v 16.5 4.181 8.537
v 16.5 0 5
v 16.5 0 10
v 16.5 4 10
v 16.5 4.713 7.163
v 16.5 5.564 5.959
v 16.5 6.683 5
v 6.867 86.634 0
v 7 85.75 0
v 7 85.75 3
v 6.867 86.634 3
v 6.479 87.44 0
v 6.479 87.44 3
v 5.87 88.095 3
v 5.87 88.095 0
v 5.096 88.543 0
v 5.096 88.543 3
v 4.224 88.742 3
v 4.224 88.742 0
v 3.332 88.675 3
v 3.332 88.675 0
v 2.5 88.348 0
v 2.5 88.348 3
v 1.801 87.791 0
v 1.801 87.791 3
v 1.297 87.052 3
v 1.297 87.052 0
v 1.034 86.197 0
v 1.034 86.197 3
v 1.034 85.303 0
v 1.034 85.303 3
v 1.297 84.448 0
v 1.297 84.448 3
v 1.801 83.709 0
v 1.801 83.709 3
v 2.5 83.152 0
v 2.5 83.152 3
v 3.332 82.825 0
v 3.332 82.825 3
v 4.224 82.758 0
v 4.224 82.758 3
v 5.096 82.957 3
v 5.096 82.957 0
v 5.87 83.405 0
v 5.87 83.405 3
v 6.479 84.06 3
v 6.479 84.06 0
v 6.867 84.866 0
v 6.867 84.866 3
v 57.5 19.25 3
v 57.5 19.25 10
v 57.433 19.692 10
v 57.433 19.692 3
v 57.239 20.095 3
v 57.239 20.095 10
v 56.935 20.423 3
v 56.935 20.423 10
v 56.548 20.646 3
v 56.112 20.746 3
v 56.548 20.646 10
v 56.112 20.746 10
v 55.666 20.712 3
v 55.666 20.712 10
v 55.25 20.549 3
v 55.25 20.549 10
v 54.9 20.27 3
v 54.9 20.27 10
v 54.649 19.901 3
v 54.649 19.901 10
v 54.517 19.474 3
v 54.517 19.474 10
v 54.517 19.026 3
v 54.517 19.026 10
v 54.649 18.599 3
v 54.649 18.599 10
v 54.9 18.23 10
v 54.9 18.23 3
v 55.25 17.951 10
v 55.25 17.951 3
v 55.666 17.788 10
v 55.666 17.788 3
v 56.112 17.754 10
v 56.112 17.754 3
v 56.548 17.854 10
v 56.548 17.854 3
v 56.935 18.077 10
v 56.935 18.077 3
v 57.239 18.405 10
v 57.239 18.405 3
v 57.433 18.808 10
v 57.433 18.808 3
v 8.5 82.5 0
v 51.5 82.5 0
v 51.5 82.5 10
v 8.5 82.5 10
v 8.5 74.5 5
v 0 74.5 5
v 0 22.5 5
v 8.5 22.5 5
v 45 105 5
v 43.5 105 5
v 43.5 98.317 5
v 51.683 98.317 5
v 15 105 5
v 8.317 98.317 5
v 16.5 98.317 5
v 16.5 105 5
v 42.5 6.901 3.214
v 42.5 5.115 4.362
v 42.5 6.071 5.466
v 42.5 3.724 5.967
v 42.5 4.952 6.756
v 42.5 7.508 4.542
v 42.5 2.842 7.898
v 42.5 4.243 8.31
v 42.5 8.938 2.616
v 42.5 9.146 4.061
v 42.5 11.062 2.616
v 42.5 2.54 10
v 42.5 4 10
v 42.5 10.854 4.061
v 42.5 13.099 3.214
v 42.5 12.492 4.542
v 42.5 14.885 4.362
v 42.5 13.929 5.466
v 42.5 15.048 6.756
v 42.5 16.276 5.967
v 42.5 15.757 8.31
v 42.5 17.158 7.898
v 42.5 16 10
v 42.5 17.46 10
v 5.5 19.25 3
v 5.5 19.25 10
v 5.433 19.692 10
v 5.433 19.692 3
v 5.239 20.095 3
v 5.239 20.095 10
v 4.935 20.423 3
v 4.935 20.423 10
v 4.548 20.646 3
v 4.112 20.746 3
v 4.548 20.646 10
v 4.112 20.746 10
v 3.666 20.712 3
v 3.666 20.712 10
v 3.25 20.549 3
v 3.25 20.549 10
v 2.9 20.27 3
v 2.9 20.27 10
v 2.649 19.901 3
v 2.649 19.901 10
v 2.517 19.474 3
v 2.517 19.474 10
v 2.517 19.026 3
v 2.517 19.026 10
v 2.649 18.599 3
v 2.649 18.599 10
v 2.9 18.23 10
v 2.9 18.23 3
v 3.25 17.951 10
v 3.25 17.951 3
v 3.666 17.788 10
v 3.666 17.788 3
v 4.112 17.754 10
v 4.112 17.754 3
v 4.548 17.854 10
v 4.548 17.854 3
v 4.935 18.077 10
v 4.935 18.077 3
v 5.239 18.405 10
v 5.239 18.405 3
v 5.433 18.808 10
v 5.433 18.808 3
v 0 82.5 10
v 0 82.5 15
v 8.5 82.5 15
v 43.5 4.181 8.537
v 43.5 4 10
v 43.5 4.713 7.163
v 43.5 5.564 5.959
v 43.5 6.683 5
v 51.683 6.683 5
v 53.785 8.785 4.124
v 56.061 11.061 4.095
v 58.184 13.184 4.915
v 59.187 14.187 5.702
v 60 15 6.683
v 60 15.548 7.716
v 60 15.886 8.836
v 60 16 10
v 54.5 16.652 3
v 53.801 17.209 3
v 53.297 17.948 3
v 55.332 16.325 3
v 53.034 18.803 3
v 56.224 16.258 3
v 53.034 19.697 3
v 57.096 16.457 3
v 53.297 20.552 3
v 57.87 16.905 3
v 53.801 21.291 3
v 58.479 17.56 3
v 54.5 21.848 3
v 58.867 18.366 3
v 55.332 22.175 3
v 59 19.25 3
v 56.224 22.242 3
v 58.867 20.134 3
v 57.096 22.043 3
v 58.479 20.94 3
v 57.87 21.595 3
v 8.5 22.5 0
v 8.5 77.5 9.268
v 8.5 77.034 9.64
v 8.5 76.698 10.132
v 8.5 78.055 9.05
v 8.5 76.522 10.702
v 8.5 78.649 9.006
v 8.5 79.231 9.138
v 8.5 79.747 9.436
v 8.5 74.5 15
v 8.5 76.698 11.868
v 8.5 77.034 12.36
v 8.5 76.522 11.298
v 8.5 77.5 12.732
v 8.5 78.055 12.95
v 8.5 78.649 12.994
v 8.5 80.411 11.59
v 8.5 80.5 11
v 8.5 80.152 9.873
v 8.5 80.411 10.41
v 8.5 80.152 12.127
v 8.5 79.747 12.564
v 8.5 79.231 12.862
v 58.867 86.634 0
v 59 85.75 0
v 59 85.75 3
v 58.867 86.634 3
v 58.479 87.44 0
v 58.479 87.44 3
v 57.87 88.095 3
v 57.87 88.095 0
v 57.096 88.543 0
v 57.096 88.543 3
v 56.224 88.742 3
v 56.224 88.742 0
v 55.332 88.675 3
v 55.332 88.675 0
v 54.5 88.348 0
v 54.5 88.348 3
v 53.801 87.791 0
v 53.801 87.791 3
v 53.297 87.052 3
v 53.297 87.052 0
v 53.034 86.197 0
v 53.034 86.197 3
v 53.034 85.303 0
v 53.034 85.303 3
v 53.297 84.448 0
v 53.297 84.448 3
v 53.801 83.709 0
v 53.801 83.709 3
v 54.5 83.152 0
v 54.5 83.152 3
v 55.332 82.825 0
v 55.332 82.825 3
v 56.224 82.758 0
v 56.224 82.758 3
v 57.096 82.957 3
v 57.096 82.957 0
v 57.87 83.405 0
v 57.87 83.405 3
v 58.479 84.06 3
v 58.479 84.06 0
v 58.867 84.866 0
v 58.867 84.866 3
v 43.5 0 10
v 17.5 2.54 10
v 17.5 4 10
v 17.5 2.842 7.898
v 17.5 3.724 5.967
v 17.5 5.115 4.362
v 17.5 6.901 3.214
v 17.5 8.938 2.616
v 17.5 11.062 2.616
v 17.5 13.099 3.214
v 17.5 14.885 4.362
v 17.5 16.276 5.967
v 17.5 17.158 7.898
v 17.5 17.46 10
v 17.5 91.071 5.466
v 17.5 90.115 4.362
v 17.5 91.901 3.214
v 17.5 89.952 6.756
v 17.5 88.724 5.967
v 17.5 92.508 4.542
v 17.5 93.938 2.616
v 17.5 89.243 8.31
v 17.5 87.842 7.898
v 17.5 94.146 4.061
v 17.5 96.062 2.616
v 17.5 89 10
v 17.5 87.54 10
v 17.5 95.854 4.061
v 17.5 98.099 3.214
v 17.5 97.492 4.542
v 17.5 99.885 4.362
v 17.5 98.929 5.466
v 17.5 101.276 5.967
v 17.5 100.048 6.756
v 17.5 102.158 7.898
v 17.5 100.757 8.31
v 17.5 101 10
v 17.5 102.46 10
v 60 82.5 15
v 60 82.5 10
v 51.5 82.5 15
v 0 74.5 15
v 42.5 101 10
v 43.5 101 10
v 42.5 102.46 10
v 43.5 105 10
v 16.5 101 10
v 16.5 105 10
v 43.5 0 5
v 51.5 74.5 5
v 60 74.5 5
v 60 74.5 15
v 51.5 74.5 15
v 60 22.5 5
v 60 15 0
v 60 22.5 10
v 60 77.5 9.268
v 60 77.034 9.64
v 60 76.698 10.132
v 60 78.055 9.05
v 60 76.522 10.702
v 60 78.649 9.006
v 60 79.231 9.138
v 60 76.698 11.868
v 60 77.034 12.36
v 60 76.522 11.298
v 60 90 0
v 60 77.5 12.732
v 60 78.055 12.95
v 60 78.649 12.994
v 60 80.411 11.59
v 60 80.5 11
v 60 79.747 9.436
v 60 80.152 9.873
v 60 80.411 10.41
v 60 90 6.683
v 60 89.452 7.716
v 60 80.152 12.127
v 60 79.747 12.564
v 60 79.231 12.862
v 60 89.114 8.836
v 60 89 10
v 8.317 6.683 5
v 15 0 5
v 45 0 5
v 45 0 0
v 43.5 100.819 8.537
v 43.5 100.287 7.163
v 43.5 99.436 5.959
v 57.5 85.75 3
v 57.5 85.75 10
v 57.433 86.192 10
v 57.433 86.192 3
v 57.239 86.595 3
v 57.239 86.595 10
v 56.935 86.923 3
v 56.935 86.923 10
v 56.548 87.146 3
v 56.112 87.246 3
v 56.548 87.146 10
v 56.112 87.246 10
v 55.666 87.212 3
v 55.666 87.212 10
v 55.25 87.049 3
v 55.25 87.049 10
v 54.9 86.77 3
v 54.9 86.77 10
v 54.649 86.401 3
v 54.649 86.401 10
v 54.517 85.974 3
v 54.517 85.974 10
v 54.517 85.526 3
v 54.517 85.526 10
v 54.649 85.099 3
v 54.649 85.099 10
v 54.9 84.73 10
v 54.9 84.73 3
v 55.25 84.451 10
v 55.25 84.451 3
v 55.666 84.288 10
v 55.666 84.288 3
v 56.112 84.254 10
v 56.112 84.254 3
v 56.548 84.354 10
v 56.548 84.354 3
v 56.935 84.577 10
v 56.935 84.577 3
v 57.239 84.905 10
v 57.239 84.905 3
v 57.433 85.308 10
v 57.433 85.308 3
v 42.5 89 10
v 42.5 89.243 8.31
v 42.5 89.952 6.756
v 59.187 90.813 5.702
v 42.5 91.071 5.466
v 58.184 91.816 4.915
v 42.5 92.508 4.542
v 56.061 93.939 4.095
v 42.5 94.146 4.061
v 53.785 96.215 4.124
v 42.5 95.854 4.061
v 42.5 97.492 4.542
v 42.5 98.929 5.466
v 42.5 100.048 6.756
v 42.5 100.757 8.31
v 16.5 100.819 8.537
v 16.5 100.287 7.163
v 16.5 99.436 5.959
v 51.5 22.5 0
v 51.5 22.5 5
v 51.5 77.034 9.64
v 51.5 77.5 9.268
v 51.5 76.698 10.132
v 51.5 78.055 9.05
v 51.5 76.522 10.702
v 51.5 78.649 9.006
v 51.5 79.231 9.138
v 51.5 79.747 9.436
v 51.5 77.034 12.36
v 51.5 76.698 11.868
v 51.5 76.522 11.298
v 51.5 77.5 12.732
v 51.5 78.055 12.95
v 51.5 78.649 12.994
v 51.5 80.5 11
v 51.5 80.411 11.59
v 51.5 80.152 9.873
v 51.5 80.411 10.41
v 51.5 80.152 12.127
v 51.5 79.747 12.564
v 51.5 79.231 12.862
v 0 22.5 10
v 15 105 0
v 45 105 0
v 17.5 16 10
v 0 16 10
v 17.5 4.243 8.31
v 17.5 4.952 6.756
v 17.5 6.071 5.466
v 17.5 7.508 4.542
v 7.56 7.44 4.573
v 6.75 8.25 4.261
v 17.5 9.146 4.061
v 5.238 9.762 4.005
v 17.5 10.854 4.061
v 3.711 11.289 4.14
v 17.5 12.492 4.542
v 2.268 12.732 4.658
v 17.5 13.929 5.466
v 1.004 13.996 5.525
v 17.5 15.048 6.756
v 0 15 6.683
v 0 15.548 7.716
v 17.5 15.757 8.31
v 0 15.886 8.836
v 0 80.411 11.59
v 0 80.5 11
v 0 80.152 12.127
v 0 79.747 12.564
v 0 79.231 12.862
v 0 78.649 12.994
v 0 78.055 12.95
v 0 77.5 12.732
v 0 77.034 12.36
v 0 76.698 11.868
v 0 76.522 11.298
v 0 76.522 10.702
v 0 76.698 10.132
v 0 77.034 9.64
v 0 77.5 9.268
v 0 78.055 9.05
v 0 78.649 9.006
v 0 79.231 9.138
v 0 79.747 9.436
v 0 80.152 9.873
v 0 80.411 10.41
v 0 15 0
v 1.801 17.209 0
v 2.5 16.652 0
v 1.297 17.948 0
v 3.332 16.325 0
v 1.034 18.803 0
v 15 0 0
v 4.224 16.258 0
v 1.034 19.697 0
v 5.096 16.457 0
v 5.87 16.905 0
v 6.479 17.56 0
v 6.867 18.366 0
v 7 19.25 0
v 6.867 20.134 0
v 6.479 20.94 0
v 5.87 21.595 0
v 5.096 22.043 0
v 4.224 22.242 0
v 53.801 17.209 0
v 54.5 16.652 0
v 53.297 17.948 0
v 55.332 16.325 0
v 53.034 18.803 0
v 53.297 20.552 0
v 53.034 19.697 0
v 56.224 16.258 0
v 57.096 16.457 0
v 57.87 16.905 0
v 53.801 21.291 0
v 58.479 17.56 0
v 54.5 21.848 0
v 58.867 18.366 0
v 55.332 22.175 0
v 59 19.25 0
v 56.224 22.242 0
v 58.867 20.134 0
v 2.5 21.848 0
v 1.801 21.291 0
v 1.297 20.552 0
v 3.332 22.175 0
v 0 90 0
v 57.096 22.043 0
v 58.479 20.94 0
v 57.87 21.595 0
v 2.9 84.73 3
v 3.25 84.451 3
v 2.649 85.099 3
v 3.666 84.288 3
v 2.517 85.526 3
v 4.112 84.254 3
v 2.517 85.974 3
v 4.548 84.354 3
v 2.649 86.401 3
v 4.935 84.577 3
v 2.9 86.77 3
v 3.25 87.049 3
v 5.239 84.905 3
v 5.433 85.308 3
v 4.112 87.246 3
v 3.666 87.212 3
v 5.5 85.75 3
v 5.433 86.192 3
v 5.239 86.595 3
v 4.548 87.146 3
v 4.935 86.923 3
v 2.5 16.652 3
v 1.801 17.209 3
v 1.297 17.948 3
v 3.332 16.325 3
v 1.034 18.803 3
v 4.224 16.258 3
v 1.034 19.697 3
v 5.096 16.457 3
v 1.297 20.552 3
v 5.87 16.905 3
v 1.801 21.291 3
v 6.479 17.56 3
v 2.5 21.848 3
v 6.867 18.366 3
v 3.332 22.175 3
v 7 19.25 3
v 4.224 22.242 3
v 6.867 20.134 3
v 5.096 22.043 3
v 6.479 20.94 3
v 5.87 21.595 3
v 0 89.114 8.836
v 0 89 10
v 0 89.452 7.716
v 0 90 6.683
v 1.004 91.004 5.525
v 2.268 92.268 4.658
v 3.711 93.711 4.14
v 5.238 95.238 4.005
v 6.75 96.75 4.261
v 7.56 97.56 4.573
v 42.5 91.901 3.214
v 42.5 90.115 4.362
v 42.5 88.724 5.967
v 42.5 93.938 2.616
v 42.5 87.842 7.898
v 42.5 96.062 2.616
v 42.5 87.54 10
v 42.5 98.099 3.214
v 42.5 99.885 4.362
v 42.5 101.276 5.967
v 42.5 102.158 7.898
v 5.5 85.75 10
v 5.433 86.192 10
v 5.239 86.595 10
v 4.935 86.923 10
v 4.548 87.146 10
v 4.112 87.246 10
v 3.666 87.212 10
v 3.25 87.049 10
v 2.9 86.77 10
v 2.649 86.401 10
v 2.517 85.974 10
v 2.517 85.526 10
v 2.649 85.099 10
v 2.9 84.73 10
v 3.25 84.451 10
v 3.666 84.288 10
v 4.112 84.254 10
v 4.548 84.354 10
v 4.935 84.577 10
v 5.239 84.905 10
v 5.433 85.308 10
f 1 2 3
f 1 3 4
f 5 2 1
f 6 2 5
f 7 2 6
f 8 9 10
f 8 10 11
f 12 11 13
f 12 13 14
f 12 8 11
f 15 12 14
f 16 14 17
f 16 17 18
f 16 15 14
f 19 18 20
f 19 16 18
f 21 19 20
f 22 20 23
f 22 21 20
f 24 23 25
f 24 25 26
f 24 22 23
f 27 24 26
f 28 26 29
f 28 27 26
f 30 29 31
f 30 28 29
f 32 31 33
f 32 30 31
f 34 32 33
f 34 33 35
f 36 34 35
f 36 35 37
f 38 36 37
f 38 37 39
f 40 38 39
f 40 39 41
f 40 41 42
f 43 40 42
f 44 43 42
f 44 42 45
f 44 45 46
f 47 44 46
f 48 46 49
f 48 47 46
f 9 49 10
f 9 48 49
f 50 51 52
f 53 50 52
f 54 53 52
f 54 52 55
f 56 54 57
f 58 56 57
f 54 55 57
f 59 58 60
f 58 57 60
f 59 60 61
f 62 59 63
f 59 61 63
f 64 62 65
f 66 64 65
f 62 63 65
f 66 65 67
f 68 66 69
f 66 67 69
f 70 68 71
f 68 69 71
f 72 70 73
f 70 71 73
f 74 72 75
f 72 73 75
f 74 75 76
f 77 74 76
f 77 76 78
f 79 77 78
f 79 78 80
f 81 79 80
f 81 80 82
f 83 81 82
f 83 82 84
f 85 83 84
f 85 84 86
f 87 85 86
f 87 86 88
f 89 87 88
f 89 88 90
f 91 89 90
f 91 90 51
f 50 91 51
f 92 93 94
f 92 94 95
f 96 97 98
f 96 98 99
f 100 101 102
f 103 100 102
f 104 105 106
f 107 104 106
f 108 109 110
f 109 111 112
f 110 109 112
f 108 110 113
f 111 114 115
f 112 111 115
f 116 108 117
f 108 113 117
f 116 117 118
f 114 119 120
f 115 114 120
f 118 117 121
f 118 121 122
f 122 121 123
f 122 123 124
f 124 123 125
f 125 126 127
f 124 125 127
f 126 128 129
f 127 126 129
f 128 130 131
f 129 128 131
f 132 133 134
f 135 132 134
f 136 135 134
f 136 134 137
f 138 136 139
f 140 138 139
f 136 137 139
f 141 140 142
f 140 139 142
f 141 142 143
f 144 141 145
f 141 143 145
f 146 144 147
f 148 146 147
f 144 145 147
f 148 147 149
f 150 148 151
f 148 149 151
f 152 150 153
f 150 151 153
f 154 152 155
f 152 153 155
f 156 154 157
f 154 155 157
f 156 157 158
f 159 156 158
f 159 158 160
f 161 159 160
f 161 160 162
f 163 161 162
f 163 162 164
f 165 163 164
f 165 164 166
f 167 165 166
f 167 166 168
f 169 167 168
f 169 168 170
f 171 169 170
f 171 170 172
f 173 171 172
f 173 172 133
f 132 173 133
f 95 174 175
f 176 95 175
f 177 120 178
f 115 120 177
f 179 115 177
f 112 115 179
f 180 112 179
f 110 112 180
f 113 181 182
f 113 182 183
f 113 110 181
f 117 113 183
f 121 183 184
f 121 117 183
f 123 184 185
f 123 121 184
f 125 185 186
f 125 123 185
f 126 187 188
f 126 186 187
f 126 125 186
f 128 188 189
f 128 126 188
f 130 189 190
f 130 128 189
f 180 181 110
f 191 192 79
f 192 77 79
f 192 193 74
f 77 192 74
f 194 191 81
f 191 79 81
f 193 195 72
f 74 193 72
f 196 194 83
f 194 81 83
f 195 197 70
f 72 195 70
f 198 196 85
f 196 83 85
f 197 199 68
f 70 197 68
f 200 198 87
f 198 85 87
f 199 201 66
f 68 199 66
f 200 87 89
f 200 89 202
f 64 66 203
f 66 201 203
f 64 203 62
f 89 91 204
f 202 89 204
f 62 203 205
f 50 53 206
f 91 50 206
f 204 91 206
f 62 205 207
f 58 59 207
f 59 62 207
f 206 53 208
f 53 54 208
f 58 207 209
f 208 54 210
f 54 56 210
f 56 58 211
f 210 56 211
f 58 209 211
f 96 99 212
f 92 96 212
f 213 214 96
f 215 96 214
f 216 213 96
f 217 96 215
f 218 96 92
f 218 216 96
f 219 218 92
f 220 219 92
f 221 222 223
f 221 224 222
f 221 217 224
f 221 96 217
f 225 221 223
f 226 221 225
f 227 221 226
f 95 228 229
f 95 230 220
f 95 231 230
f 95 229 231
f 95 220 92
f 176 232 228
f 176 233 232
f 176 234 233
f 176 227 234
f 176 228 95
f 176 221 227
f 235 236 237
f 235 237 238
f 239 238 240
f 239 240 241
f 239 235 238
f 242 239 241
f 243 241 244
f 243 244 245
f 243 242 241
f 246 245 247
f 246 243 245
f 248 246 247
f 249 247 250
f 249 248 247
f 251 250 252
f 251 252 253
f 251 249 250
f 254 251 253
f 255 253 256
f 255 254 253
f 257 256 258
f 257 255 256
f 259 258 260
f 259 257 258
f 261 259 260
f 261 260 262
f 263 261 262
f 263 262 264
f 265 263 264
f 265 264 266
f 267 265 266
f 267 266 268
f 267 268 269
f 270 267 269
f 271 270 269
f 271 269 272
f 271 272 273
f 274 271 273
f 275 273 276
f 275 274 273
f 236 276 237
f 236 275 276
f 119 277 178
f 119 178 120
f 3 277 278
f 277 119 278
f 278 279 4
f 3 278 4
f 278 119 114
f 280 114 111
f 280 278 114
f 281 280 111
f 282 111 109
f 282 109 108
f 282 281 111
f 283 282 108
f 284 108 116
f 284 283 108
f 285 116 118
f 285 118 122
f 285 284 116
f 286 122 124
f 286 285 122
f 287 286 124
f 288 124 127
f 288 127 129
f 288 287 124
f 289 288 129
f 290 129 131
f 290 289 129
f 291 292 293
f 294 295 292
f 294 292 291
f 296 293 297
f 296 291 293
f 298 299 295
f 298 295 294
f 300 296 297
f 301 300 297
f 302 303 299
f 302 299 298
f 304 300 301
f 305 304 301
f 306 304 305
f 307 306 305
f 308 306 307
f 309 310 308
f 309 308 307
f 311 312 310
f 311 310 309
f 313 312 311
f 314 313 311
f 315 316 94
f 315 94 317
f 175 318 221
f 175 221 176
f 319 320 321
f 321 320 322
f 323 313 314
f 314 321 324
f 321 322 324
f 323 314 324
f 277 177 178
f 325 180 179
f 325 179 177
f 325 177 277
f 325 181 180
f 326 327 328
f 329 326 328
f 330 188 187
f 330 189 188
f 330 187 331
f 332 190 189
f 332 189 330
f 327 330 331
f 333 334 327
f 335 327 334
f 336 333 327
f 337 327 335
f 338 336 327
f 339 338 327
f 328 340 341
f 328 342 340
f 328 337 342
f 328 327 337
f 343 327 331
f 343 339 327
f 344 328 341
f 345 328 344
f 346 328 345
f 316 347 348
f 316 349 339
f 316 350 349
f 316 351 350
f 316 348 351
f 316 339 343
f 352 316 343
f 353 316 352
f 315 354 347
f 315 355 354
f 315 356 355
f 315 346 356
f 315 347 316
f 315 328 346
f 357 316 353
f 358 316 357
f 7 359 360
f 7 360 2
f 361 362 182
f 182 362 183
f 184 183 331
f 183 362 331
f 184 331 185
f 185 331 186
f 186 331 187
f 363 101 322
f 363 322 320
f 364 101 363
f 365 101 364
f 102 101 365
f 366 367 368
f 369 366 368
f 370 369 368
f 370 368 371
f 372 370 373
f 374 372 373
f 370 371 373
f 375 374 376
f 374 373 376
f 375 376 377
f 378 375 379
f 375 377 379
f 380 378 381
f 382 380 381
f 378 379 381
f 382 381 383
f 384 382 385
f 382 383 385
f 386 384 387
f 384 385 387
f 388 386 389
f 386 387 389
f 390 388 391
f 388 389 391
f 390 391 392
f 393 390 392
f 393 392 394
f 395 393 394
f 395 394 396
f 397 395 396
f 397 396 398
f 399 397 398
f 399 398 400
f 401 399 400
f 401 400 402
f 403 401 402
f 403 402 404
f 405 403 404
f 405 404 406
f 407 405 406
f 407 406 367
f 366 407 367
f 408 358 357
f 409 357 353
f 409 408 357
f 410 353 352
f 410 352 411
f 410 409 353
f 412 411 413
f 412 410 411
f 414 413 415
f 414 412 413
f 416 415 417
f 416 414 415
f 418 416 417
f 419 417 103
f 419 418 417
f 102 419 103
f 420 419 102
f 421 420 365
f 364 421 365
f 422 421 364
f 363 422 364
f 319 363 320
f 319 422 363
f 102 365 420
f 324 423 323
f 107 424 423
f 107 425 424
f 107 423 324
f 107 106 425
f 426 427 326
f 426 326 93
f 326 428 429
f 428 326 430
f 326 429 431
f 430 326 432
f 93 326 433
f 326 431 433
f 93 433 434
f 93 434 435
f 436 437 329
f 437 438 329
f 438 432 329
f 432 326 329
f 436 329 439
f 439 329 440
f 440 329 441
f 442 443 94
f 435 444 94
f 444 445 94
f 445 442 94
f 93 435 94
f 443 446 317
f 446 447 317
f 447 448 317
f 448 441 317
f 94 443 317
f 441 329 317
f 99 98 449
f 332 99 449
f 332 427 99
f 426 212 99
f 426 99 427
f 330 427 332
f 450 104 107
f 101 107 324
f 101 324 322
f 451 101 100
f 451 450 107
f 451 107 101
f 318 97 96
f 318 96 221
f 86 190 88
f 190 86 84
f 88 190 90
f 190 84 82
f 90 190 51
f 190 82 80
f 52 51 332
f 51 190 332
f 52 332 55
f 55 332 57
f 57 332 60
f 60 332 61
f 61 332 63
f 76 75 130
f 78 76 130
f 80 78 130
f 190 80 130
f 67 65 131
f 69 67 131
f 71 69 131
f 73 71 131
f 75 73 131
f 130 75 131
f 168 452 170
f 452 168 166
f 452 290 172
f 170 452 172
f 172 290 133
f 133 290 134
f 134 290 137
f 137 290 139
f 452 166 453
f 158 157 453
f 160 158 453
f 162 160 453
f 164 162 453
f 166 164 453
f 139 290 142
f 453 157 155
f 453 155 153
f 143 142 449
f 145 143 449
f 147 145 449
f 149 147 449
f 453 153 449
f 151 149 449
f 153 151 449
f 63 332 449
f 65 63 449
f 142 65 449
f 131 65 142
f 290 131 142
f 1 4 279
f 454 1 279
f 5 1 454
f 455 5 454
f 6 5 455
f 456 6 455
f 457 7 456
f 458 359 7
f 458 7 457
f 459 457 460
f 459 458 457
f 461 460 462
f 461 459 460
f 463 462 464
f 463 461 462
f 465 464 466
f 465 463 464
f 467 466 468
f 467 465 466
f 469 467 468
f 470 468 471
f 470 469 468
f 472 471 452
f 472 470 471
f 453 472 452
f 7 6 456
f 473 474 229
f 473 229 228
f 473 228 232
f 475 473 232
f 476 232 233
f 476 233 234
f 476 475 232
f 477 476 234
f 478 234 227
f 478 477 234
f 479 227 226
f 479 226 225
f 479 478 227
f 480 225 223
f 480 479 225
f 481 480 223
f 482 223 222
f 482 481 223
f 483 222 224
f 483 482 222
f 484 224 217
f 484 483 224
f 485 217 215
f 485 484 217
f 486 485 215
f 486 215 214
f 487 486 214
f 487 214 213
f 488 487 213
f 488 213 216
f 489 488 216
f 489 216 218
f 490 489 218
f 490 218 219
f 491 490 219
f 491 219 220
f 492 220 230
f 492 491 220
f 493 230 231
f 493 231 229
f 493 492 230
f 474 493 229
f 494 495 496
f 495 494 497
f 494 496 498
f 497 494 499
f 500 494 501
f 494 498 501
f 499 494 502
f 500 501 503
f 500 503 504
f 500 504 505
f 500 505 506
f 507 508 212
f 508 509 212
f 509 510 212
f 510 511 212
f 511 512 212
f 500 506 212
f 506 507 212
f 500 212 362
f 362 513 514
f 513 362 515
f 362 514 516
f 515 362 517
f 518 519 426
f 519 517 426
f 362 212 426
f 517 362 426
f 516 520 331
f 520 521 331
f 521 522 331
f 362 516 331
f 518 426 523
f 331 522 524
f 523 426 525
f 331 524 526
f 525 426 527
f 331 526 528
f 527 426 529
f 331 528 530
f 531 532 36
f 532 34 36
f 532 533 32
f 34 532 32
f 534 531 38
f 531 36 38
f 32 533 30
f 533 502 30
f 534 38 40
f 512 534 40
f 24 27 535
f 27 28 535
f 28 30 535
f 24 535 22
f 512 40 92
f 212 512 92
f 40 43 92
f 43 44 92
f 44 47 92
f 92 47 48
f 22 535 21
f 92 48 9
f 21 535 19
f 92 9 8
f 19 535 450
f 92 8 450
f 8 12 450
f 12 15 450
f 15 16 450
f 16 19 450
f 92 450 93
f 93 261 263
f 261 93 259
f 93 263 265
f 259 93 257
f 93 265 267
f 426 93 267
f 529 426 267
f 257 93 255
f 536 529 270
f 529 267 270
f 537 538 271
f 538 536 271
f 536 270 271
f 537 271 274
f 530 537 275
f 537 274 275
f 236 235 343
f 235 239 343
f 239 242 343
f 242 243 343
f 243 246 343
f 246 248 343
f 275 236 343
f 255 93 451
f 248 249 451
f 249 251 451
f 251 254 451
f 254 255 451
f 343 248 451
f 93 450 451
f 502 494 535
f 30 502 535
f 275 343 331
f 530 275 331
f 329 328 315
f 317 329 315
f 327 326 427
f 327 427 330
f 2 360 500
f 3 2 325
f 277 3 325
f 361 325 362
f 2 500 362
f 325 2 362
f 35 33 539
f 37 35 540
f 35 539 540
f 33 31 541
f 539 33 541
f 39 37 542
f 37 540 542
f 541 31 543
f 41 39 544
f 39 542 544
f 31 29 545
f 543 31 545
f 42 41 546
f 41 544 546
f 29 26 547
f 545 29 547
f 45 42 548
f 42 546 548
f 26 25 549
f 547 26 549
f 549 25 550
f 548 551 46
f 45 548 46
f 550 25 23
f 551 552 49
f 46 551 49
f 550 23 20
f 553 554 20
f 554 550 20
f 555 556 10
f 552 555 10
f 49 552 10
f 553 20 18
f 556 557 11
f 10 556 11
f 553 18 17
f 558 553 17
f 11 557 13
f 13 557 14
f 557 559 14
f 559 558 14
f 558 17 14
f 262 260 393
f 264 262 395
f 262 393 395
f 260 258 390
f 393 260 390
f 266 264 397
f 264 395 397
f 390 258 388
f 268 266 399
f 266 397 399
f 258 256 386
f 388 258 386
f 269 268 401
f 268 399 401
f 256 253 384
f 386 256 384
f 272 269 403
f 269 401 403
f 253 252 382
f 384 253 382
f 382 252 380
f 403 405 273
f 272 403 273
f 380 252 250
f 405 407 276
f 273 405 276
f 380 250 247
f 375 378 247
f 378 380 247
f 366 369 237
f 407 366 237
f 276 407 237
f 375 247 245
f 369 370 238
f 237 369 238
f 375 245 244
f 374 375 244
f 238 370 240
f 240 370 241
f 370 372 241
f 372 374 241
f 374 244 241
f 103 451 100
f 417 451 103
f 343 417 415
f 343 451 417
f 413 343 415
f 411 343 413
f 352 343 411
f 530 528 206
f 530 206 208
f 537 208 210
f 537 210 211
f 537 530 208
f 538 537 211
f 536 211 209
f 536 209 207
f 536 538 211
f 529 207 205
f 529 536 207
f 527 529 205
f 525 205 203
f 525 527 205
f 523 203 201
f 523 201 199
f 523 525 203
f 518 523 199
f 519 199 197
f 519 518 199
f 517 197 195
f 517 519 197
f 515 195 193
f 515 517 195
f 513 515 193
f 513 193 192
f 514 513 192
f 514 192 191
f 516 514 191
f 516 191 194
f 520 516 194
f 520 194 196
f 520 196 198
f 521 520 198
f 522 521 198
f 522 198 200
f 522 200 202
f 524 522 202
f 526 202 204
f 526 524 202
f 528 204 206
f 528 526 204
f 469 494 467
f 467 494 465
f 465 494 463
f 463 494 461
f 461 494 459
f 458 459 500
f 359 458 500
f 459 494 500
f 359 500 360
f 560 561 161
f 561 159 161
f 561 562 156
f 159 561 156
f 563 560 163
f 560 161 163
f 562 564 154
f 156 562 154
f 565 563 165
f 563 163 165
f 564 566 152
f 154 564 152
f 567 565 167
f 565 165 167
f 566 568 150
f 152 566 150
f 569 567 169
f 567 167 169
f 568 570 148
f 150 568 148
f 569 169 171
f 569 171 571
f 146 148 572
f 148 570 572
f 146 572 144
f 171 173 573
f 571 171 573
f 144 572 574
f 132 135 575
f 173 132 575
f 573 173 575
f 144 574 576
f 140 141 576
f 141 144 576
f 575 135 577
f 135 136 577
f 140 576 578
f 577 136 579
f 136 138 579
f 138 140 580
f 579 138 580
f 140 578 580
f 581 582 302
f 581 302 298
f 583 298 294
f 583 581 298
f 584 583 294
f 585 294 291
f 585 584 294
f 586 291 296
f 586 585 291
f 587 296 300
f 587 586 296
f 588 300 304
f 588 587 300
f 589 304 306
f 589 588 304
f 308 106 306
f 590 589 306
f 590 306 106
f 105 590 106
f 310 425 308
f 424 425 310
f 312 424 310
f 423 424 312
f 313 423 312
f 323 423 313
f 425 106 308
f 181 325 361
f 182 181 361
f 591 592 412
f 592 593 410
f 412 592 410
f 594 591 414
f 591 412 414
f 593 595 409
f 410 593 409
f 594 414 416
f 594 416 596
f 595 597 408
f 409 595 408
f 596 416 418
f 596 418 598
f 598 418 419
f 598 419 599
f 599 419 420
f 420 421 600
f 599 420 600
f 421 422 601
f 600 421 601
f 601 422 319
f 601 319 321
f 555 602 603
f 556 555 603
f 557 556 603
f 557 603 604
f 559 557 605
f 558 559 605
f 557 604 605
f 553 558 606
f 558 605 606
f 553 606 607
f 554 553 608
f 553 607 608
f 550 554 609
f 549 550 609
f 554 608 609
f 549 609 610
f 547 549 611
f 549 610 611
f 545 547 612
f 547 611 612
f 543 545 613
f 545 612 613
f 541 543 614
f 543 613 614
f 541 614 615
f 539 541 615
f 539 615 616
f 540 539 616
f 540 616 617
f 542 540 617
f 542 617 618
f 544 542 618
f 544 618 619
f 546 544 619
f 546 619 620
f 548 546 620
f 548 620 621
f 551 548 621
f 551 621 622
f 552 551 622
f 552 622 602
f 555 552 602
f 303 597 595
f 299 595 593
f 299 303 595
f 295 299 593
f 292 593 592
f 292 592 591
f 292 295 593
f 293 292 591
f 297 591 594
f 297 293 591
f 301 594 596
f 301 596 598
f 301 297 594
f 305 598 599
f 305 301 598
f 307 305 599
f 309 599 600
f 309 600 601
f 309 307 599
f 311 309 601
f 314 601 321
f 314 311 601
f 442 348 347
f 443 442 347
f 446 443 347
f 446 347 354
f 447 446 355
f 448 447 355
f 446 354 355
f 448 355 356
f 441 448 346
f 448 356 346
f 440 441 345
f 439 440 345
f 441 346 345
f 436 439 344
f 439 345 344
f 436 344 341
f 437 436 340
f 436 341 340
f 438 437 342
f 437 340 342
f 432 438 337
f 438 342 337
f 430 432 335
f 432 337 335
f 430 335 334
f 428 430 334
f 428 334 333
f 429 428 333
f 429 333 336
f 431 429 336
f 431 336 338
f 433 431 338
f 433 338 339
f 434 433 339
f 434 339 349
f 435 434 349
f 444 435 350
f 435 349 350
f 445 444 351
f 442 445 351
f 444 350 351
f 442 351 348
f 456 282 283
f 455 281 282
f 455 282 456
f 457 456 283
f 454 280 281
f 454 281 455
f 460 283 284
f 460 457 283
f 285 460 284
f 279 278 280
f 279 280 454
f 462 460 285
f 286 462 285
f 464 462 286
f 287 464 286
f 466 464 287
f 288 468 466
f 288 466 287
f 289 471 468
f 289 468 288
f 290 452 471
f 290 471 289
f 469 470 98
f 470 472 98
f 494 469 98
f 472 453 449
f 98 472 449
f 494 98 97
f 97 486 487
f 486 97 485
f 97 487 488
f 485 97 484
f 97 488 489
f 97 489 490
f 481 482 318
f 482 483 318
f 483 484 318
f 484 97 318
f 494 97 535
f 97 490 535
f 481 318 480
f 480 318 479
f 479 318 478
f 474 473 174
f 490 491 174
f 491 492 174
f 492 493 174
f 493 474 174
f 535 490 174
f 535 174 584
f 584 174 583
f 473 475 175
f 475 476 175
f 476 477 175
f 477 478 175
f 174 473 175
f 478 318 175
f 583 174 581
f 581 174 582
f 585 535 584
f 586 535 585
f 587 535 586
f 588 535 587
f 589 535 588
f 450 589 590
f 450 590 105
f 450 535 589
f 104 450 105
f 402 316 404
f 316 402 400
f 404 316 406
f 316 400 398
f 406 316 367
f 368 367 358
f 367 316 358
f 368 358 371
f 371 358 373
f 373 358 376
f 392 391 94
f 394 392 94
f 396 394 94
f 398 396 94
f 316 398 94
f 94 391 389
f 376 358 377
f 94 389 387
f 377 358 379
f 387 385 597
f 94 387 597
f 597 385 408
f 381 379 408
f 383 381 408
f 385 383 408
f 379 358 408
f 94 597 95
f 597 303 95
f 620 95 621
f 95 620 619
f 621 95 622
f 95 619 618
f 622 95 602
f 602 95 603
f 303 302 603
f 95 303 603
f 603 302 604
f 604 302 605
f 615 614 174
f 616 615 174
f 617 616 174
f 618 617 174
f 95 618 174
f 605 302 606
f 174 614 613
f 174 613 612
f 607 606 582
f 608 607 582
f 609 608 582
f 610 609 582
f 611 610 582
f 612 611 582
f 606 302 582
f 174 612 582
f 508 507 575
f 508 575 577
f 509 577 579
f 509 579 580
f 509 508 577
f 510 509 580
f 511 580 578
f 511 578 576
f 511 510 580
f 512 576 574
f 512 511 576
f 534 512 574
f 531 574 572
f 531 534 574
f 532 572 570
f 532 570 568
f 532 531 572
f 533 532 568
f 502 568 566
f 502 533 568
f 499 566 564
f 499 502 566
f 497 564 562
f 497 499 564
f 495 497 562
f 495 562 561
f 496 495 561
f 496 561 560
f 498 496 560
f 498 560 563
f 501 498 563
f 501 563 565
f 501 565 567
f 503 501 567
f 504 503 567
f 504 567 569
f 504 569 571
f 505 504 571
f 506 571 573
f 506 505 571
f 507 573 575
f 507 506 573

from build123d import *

# Parameters (mm, degrees)
SKETCH003_R  = 7.46
PAD002_DEPTH = 25
SKETCH006_R  = 6
PAD005_DEPTH = 60
SKETCH007_R  = 1.5
PAD006_DEPTH = 10
SKETCH008_R  = 3
PAD007_DEPTH = 3
SKETCH_W     = 60
SKETCH_H     = 105
SKETCH_W_2   = 43
SKETCH_H_2   = 60
PAD_DEPTH    = 5
SKETCH005_W  = 8
SKETCH005_H  = 10
SKETCH005_R  = 2
PAD004_DEPTH = 8.5
SKETCH004_W  = 8
SKETCH004_H  = 10
SKETCH004_R  = 2
PAD003_DEPTH = 8.5
PAD001_DEPTH = 5
CHAMFER_SIZE = 15


with BuildPart() as bearingslot:
    # Sketch003 → Pad002 (new body)
    with BuildSketch(Plane.YZ.offset(17.5)):
        with Locations((10, 10)):
            Circle(SKETCH003_R)
        with Locations((95, 10)):
            Circle(SKETCH003_R)
    extrude(amount=PAD002_DEPTH)


with BuildPart() as rodslot:
    # Sketch006 → Pad005 (new body)
    with BuildSketch(Plane.YZ):
        with Locations((10, 10)):
            Circle(SKETCH006_R)
        with Locations((95, 10)):
            Circle(SKETCH006_R)
    extrude(amount=PAD005_DEPTH)


with BuildPart() as mountpoints:
    # Sketch007 → Pad006 (new body)
    with BuildSketch(Plane.XY.offset(10)):
        with Locations((4, 19.25)):
            Circle(SKETCH007_R)
        with Locations((56, 19.25)):
            Circle(SKETCH007_R)
        with Locations((56, 85.75)):
            Circle(SKETCH007_R)
        with Locations((4, 85.75)):
            Circle(SKETCH007_R)
    extrude(amount=-PAD006_DEPTH)


with BuildPart() as cutblocks:
    # Sketch008 → Pad007 (new body)
    with BuildSketch(Plane.XY):
        with Locations((4, 85.75)):
            Circle(SKETCH008_R)
        with Locations((56, 85.75)):
            Circle(SKETCH008_R)
        with Locations((56, 19.25)):
            Circle(SKETCH008_R)
        with Locations((4, 19.25)):
            Circle(SKETCH008_R)
    extrude(amount=PAD007_DEPTH)

    # Fusion: union BearingSlot, RodSlot, MountPoints
    add(bearingslot.part)
    add(rodslot.part)
    add(mountpoints.part)


with BuildPart() as base:
    # Sketch → Pad (new body)
    with BuildSketch(Plane.XY):
        with Locations((30, 52.5)):
            Rectangle(SKETCH_W, SKETCH_H)
        with Locations((30, 52.5)):
            Rectangle(SKETCH_W_2, SKETCH_H_2, mode=Mode.SUBTRACT)
    extrude(amount=PAD_DEPTH)


with BuildPart() as rleverhinge:
    # Sketch005 → Pad004 (new body)
    with BuildSketch(Plane.YZ.offset(60)):
        with Locations((78.5, 10)):
            Rectangle(SKETCH005_W, SKETCH005_H)
        with Locations((78.5, 11)):
            Circle(SKETCH005_R, mode=Mode.SUBTRACT)
    extrude(amount=-PAD004_DEPTH)


with BuildPart() as lleverhinge:
    # Sketch004 → Pad003 (new body)
    with BuildSketch(Plane.YZ):
        with Locations((78.5, 10)):
            Rectangle(SKETCH004_W, SKETCH004_H)
        with Locations((78.5, 11)):
            Circle(SKETCH004_R, mode=Mode.SUBTRACT)
    extrude(amount=PAD003_DEPTH)


with BuildPart() as chamfer_body:
    # Pad001 base: copy of Base
    add(base.part)

    # Sketch001 → Pad001 (new body)
    with BuildSketch(Plane.XY.offset(5)):
        Polygon((16.5, 105), (43.5, 105), (43.5, 92.5), (60, 92.5), (60, 82.5), (0, 82.5), (0, 92.5), (16.5, 92.5), align=None)
        Polygon((0, 22.5), (60, 22.5), (60, 12.5), (43.5, 12.5), (43.5, 0), (16.5, 0), (16.5, 12.5), (0, 12.5), align=None)
    extrude(amount=PAD001_DEPTH)

    # Fusion001: union Base, RLeverHinge, LLeverHinge
    add(base.part)
    add(rleverhinge.part)
    add(lleverhinge.part)

    # Cut: cut CutBlocks
    add(cutblocks.part, mode=Mode.SUBTRACT)

    # Chamfer
    chamfer_edges = [chamfer_body.edges().sort_by_distance(p)[0] for p in [
        (0, 105, 2.5),
        (60, 0, 2.5),
        (60, 105, 2.5),
        (0, 0, 2.5),
    ]]
    chamfer(chamfer_edges, length=CHAMFER_SIZE)


solid = chamfer_body.part
